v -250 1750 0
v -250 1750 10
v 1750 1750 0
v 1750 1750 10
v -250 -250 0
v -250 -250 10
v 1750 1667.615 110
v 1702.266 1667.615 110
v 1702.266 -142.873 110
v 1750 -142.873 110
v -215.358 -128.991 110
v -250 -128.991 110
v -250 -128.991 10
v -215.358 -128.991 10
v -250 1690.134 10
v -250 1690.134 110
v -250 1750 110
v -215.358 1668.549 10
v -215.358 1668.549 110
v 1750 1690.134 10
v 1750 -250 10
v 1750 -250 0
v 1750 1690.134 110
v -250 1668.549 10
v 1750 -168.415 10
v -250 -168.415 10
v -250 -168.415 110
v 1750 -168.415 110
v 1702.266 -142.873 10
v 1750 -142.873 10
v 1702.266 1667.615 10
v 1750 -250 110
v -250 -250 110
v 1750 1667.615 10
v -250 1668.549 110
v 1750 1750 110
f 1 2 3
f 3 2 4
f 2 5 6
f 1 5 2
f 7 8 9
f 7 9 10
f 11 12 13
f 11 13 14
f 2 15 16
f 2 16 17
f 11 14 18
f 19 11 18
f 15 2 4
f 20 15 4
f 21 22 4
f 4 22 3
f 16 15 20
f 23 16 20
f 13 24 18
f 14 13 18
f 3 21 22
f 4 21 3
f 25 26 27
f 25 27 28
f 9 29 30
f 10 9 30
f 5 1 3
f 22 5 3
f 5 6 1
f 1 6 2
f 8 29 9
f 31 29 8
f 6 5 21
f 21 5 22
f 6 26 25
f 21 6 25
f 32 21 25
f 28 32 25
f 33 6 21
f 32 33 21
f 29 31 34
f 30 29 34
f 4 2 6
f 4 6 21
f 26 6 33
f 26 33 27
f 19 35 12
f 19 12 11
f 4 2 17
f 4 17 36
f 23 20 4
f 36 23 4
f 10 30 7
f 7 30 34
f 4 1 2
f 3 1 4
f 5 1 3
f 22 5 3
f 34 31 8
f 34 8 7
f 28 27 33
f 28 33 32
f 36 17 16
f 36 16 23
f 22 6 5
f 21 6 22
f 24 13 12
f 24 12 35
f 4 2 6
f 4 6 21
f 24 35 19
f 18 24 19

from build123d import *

# Parameters (mm, degrees)
SKETCH1_W           = 2000
SKETCH1_H           = 2000
BOSS_EXTRUDE1_DEPTH = 10
SKETCH2_W           = 2000
SKETCH2_H           = 2000
BOSS_EXTRUDE2_DEPTH = 10
SKETCH3_W           = 2000
SKETCH3_H           = 59.866245655
BOSS_EXTRUDE3_DEPTH = 100
SKETCH4_W           = 2000
SKETCH4_H           = 81.585108981
BOSS_EXTRUDE4_DEPTH = 100
SKETCH5_W           = 47.734318133
SKETCH5_H           = 1810.488542103
BOSS_EXTRUDE5_DEPTH = 100
SKETCH6_W           = 34.642183049
SKETCH6_H           = 1797.540465537
BOSS_EXTRUDE6_DEPTH = 100


with BuildPart() as part:
    # Sketch1 → Boss-Extrude1 (new body)
    with BuildSketch(Plane.XY):
        with Locations((750, 750)):
            Rectangle(SKETCH1_W, SKETCH1_H)
    extrude(amount=BOSS_EXTRUDE1_DEPTH)


with BuildPart() as body_2:
    # Sketch2 → Boss-Extrude2 (new body)
    with BuildSketch(Plane.XY.offset(10)):
        with Locations((750, 750)):
            Rectangle(SKETCH2_W, SKETCH2_H)
    extrude(amount=-BOSS_EXTRUDE2_DEPTH)


with BuildPart() as body_3:
    # Sketch3 → Boss-Extrude3 (new body)
    with BuildSketch(Plane.XY.offset(10)):
        with Locations((750, 1720.066877172)):
            Rectangle(SKETCH3_W, SKETCH3_H)
    extrude(amount=BOSS_EXTRUDE3_DEPTH)


with BuildPart() as body_4:
    # Sketch4 → Boss-Extrude4 (new body)
    with BuildSketch(Plane.XY.offset(10)):
        with Locations((750, -209.20744551)):
            Rectangle(SKETCH4_W, SKETCH4_H)
    extrude(amount=BOSS_EXTRUDE4_DEPTH)


with BuildPart() as body_5:
    # Sketch5 → Boss-Extrude5 (new body)
    with BuildSketch(Plane.XY.offset(10)):
        with Locations((1726.132840934, 762.3708112)):
            Rectangle(SKETCH5_W, SKETCH5_H)
    extrude(amount=BOSS_EXTRUDE5_DEPTH)


with BuildPart() as body_6:
    # Sketch6 → Boss-Extrude6 (new body)
    with BuildSketch(Plane.XY.offset(10)):
        with Locations((-232.678908476, 769.7788276)):
            Rectangle(SKETCH6_W, SKETCH6_H)
    extrude(amount=BOSS_EXTRUDE6_DEPTH)


solid = Compound([part.part, body_2.part, body_3.part, body_4.part, body_5.part, body_6.part])
